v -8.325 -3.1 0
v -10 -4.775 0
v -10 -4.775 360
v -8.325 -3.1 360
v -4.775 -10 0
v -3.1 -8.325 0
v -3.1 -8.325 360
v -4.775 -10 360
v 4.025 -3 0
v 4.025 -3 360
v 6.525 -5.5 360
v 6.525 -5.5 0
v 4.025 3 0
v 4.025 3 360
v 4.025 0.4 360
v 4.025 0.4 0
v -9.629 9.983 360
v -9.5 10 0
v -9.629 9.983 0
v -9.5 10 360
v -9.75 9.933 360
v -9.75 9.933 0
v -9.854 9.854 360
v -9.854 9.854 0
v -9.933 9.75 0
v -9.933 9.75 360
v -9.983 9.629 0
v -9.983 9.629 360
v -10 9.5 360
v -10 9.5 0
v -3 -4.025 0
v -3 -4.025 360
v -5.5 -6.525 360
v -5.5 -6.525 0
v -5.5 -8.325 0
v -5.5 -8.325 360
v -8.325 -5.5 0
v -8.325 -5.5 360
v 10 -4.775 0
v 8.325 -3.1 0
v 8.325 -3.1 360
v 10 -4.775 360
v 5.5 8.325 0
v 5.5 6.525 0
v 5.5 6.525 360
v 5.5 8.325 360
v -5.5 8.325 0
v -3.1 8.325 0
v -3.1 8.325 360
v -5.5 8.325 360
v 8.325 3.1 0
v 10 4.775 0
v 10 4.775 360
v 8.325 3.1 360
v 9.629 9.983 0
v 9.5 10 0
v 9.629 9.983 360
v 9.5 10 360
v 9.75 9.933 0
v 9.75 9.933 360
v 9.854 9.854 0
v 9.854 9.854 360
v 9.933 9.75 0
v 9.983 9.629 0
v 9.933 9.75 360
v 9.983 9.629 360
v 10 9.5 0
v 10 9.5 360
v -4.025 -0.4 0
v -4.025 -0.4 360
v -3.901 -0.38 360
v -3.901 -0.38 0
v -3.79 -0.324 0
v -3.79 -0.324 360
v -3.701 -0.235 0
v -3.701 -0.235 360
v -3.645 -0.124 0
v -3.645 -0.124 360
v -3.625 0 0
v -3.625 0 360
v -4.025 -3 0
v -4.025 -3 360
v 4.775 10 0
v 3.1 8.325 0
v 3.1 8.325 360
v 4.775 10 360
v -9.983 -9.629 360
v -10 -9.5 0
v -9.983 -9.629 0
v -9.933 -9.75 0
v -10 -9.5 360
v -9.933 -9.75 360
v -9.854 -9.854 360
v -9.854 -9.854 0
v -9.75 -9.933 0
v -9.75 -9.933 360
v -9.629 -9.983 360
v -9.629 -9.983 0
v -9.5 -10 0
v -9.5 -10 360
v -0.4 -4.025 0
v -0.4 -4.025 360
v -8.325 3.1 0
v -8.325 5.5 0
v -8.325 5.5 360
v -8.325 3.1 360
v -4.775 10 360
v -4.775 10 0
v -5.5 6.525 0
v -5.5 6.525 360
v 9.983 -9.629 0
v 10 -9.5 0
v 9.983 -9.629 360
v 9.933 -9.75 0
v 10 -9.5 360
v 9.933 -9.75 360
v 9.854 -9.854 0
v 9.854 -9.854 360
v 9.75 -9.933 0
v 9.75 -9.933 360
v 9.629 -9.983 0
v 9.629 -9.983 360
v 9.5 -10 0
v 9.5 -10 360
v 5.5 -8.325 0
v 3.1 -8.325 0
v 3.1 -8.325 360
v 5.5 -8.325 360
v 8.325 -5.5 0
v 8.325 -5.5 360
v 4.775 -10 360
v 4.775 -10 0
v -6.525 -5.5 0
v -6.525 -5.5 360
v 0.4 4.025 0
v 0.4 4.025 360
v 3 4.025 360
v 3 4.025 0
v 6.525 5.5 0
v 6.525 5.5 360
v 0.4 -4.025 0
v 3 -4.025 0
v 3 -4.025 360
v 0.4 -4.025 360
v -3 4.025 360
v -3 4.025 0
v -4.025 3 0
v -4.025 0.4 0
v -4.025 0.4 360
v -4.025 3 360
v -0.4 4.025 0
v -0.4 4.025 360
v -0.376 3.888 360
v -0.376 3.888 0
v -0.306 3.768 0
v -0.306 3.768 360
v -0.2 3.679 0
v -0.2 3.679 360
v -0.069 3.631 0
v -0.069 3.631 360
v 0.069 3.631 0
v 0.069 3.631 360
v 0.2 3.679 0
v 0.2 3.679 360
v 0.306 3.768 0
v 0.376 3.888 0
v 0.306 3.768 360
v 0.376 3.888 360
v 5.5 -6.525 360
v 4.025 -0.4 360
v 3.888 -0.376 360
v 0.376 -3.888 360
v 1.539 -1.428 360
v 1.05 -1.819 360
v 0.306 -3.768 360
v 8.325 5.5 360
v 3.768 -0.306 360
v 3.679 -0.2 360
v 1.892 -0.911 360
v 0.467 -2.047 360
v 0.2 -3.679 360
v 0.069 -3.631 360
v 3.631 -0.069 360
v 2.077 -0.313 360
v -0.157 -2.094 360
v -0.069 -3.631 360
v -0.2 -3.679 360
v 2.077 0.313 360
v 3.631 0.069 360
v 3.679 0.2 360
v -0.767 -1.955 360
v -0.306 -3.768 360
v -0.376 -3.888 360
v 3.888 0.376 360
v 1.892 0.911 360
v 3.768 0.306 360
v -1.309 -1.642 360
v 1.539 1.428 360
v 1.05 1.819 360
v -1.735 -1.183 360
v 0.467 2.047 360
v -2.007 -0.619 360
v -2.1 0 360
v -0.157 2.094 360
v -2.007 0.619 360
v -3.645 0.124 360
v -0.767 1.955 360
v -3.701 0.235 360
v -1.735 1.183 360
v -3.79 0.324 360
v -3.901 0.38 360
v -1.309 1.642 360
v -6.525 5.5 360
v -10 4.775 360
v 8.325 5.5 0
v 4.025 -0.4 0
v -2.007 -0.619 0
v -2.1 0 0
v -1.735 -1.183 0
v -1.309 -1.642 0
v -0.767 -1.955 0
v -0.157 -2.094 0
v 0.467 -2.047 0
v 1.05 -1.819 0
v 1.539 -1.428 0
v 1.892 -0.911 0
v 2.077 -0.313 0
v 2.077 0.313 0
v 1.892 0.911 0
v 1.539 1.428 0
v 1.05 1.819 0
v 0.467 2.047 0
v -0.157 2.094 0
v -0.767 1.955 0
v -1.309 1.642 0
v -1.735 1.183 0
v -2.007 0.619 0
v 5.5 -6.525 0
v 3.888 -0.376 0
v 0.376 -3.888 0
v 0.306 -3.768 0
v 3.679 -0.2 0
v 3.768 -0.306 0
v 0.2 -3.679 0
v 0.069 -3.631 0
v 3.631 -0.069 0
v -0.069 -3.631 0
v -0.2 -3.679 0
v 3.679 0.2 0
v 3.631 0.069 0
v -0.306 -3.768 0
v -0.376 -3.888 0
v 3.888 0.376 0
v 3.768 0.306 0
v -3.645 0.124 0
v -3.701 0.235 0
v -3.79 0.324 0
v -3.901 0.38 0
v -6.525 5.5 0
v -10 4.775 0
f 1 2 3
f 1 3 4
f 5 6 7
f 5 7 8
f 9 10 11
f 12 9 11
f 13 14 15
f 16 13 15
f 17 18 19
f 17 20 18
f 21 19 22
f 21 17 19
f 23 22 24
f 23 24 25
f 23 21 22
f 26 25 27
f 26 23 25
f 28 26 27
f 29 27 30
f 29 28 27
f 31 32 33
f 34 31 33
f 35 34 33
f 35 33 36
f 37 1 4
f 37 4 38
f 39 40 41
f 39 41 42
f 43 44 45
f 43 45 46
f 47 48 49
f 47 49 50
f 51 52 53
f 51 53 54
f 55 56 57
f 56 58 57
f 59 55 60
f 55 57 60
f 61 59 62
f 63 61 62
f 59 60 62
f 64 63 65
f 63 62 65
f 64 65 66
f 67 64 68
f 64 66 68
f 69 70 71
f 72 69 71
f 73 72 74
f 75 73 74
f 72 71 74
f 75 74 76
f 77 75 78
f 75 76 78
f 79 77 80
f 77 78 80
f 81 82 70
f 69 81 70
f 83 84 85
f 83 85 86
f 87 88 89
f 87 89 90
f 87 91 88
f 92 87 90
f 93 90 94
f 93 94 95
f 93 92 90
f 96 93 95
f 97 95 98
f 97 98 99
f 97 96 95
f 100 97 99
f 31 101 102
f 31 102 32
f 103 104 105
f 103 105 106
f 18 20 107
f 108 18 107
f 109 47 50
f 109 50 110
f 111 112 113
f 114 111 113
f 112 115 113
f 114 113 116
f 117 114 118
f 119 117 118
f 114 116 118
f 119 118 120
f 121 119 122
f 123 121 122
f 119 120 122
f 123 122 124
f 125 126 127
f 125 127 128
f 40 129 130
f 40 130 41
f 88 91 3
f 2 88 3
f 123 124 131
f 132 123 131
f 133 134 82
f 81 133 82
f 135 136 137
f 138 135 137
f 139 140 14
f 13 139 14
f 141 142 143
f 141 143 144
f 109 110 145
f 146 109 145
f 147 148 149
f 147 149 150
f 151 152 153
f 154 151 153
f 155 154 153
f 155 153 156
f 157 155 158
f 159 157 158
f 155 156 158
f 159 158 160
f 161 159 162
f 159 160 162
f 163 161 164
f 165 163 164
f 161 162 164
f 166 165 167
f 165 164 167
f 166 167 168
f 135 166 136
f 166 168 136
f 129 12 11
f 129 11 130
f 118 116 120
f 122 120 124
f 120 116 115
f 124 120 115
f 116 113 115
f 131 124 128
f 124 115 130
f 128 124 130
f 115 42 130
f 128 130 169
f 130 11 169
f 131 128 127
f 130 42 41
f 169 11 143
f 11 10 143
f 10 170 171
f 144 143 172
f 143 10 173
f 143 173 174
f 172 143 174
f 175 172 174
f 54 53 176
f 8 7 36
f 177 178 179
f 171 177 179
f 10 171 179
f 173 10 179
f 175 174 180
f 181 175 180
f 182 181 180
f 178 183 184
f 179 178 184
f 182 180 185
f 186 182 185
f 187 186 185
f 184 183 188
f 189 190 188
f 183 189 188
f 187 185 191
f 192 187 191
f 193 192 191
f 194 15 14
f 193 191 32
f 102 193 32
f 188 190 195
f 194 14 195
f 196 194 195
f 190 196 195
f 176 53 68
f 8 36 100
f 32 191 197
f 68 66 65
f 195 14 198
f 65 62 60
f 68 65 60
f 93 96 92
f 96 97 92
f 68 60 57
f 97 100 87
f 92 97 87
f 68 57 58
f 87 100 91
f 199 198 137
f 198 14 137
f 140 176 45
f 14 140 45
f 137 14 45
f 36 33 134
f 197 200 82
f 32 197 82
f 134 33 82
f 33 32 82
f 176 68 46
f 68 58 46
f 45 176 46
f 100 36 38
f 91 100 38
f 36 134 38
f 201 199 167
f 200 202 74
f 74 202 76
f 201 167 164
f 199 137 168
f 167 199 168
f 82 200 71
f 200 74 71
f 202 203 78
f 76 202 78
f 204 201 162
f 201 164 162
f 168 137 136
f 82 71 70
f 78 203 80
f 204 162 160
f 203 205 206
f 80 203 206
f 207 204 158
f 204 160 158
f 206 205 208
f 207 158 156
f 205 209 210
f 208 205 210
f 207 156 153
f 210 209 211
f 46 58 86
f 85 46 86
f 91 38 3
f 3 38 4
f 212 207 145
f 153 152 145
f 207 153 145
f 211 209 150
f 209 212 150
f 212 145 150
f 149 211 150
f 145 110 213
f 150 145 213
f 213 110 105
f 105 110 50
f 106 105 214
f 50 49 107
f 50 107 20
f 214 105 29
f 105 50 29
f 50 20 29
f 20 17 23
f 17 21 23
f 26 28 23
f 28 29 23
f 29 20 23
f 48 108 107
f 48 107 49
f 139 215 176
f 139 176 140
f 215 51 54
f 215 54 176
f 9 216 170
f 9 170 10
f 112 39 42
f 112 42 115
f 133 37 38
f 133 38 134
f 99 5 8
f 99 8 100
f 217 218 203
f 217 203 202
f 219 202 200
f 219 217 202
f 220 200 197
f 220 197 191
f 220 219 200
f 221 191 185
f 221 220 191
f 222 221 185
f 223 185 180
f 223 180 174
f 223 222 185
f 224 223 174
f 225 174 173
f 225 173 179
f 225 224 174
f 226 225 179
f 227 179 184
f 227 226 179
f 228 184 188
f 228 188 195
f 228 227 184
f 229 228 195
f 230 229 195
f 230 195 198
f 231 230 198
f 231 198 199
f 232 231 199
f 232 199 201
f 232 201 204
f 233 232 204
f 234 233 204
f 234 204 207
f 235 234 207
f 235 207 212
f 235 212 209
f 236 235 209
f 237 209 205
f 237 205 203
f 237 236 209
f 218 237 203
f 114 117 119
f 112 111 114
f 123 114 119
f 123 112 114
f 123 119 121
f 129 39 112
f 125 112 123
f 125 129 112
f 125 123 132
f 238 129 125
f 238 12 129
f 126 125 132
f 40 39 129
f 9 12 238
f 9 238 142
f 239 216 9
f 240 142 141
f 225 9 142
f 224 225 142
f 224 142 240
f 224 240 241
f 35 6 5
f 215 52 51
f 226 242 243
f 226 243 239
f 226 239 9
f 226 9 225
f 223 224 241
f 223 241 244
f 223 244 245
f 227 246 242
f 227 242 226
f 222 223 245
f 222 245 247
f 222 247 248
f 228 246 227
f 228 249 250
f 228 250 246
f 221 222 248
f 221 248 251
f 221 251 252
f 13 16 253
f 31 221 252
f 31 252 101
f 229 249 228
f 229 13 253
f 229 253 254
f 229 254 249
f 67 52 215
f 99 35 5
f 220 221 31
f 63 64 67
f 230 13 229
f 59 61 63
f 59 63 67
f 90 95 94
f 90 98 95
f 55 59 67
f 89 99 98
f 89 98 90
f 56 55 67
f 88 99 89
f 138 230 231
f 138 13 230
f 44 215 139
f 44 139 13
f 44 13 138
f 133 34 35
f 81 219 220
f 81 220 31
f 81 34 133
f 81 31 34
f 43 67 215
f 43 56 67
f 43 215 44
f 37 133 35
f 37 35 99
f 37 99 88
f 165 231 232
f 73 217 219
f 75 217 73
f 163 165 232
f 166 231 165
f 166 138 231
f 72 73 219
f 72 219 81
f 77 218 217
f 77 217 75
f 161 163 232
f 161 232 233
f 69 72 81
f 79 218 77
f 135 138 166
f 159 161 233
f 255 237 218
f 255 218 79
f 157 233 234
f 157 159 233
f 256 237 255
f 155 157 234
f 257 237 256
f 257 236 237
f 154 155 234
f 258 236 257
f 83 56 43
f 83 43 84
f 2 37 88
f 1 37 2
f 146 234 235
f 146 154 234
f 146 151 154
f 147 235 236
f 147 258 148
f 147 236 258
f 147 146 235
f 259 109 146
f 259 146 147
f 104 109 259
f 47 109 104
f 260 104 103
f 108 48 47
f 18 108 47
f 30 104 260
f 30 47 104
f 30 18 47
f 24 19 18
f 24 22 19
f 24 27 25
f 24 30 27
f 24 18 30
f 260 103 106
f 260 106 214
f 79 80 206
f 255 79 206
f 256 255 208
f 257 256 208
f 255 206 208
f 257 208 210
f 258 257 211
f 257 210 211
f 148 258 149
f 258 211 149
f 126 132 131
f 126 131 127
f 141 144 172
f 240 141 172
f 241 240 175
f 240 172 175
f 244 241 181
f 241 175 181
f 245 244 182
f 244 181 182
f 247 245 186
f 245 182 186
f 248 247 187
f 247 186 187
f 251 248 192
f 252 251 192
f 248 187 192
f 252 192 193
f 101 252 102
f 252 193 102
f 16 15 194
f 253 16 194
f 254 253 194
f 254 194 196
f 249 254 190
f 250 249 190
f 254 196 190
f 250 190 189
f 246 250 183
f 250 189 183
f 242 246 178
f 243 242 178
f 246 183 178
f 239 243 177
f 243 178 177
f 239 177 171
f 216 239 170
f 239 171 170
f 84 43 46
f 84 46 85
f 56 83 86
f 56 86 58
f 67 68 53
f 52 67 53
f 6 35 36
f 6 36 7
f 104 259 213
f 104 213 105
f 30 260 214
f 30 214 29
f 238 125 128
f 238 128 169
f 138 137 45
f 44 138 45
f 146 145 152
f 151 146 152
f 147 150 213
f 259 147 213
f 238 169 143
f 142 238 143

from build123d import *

# Parameters (mm, degrees)
SKETCH1_R           = 2.1
BOSS_EXTRUDE1_DEPTH = 360
FILLET1_R           = 0.5
CUT_EXTRUDE1_DEPTH  = 361.277670693


with BuildPart() as part:
    # Sketch1 → Boss-Extrude1 (new body)
    with BuildSketch(Plane.XY):
        Polygon((-10, 10), (-4.775, 10), (-3.1, 8.325), (-5.5, 8.325), (-5.5, 6.525), (-3, 4.025), (3, 4.025), (5.5, 6.525), (5.5, 8.325), (3.1, 8.325), (4.775, 10), (10, 10), (10, 4.775), (8.325, 3.1), (8.325, 5.5), (6.525, 5.5), (4.025, 3), (4.025, -3), (6.525, -5.5), (8.325, -5.5), (8.325, -3.1), (10, -4.775), (10, -10), (4.775, -10), (3.1, -8.325), (5.5, -8.325), (5.5, -6.525), (3, -4.025), (-3, -4.025), (-5.5, -6.525), (-5.5, -8.325), (-3.1, -8.325), (-4.775, -10), (-10, -10), (-10, -4.775), (-8.325, -3.1), (-8.325, -5.5), (-6.525, -5.5), (-4.025, -3), (-4.025, 3), (-6.525, 5.5), (-8.325, 5.5), (-8.325, 3.1), (-10, 4.775), align=None)
        with Locations(Location((0, 0, 0), (0, 0, 180))):
            Circle(SKETCH1_R, mode=Mode.SUBTRACT)
    extrude(amount=BOSS_EXTRUDE1_DEPTH)

    # Fillet1
    fillet1_edges = [part.edges().sort_by_distance(p)[0] for p in [
        (10, -10, 180),
        (-10, -10, 180),
        (-10, 10, 180),
        (10, 10, 180),
    ]]
    fillet(fillet1_edges, radius=FILLET1_R)

    # Sketch2 → Cut-Extrude1 (cut, through all)
    with BuildSketch(Plane.XY.offset(360)):
        with BuildLine():
            ThreePointArc((-4.025, 0.4), (-4.425, 0), (-4.025, -0.4))
            Line((-4.025, -0.4), (-4.025, 0.4))
        make_face()
        with BuildLine():
            Line((-4.025, 0.4), (-4.025, -0.4))
            ThreePointArc((-4.025, -0.4), (-3.742157288, -0.282842712), (-3.625, 0))
            ThreePointArc((-3.625, 0), (-3.742157288, 0.282842712), (-4.025, 0.4))
        make_face()
        with BuildLine():
            ThreePointArc((0.4, 4.025), (0, 4.425), (-0.4, 4.025))
            Line((-0.4, 4.025), (0.4, 4.025))
        make_face()
        with BuildLine():
            Line((0.4, 4.025), (-0.4, 4.025))
            ThreePointArc((-0.4, 4.025), (0, 3.625), (0.4, 4.025))
        make_face()
        with BuildLine():
            ThreePointArc((4.025, 0.4), (3.625, 0), (4.025, -0.4))
            Line((4.025, -0.4), (4.025, 0.4))
        make_face()
        with BuildLine():
            Line((4.025, 0.4), (4.025, -0.4))
            ThreePointArc((4.025, -0.4), (4.307842712, -0.282842712), (4.425, 0))
            ThreePointArc((4.425, 0), (4.307842712, 0.282842712), (4.025, 0.4))
        make_face()
        with BuildLine():
            ThreePointArc((0.4, -4.025), (0, -3.625), (-0.4, -4.025))
            Line((-0.4, -4.025), (0.4, -4.025))
        make_face()
        with BuildLine():
            Line((0.4, -4.025), (-0.4, -4.025))
            ThreePointArc((-0.4, -4.025), (0, -4.425), (0.4, -4.025))
        make_face()
    extrude(amount=-CUT_EXTRUDE1_DEPTH, mode=Mode.SUBTRACT)


solid = part.part
